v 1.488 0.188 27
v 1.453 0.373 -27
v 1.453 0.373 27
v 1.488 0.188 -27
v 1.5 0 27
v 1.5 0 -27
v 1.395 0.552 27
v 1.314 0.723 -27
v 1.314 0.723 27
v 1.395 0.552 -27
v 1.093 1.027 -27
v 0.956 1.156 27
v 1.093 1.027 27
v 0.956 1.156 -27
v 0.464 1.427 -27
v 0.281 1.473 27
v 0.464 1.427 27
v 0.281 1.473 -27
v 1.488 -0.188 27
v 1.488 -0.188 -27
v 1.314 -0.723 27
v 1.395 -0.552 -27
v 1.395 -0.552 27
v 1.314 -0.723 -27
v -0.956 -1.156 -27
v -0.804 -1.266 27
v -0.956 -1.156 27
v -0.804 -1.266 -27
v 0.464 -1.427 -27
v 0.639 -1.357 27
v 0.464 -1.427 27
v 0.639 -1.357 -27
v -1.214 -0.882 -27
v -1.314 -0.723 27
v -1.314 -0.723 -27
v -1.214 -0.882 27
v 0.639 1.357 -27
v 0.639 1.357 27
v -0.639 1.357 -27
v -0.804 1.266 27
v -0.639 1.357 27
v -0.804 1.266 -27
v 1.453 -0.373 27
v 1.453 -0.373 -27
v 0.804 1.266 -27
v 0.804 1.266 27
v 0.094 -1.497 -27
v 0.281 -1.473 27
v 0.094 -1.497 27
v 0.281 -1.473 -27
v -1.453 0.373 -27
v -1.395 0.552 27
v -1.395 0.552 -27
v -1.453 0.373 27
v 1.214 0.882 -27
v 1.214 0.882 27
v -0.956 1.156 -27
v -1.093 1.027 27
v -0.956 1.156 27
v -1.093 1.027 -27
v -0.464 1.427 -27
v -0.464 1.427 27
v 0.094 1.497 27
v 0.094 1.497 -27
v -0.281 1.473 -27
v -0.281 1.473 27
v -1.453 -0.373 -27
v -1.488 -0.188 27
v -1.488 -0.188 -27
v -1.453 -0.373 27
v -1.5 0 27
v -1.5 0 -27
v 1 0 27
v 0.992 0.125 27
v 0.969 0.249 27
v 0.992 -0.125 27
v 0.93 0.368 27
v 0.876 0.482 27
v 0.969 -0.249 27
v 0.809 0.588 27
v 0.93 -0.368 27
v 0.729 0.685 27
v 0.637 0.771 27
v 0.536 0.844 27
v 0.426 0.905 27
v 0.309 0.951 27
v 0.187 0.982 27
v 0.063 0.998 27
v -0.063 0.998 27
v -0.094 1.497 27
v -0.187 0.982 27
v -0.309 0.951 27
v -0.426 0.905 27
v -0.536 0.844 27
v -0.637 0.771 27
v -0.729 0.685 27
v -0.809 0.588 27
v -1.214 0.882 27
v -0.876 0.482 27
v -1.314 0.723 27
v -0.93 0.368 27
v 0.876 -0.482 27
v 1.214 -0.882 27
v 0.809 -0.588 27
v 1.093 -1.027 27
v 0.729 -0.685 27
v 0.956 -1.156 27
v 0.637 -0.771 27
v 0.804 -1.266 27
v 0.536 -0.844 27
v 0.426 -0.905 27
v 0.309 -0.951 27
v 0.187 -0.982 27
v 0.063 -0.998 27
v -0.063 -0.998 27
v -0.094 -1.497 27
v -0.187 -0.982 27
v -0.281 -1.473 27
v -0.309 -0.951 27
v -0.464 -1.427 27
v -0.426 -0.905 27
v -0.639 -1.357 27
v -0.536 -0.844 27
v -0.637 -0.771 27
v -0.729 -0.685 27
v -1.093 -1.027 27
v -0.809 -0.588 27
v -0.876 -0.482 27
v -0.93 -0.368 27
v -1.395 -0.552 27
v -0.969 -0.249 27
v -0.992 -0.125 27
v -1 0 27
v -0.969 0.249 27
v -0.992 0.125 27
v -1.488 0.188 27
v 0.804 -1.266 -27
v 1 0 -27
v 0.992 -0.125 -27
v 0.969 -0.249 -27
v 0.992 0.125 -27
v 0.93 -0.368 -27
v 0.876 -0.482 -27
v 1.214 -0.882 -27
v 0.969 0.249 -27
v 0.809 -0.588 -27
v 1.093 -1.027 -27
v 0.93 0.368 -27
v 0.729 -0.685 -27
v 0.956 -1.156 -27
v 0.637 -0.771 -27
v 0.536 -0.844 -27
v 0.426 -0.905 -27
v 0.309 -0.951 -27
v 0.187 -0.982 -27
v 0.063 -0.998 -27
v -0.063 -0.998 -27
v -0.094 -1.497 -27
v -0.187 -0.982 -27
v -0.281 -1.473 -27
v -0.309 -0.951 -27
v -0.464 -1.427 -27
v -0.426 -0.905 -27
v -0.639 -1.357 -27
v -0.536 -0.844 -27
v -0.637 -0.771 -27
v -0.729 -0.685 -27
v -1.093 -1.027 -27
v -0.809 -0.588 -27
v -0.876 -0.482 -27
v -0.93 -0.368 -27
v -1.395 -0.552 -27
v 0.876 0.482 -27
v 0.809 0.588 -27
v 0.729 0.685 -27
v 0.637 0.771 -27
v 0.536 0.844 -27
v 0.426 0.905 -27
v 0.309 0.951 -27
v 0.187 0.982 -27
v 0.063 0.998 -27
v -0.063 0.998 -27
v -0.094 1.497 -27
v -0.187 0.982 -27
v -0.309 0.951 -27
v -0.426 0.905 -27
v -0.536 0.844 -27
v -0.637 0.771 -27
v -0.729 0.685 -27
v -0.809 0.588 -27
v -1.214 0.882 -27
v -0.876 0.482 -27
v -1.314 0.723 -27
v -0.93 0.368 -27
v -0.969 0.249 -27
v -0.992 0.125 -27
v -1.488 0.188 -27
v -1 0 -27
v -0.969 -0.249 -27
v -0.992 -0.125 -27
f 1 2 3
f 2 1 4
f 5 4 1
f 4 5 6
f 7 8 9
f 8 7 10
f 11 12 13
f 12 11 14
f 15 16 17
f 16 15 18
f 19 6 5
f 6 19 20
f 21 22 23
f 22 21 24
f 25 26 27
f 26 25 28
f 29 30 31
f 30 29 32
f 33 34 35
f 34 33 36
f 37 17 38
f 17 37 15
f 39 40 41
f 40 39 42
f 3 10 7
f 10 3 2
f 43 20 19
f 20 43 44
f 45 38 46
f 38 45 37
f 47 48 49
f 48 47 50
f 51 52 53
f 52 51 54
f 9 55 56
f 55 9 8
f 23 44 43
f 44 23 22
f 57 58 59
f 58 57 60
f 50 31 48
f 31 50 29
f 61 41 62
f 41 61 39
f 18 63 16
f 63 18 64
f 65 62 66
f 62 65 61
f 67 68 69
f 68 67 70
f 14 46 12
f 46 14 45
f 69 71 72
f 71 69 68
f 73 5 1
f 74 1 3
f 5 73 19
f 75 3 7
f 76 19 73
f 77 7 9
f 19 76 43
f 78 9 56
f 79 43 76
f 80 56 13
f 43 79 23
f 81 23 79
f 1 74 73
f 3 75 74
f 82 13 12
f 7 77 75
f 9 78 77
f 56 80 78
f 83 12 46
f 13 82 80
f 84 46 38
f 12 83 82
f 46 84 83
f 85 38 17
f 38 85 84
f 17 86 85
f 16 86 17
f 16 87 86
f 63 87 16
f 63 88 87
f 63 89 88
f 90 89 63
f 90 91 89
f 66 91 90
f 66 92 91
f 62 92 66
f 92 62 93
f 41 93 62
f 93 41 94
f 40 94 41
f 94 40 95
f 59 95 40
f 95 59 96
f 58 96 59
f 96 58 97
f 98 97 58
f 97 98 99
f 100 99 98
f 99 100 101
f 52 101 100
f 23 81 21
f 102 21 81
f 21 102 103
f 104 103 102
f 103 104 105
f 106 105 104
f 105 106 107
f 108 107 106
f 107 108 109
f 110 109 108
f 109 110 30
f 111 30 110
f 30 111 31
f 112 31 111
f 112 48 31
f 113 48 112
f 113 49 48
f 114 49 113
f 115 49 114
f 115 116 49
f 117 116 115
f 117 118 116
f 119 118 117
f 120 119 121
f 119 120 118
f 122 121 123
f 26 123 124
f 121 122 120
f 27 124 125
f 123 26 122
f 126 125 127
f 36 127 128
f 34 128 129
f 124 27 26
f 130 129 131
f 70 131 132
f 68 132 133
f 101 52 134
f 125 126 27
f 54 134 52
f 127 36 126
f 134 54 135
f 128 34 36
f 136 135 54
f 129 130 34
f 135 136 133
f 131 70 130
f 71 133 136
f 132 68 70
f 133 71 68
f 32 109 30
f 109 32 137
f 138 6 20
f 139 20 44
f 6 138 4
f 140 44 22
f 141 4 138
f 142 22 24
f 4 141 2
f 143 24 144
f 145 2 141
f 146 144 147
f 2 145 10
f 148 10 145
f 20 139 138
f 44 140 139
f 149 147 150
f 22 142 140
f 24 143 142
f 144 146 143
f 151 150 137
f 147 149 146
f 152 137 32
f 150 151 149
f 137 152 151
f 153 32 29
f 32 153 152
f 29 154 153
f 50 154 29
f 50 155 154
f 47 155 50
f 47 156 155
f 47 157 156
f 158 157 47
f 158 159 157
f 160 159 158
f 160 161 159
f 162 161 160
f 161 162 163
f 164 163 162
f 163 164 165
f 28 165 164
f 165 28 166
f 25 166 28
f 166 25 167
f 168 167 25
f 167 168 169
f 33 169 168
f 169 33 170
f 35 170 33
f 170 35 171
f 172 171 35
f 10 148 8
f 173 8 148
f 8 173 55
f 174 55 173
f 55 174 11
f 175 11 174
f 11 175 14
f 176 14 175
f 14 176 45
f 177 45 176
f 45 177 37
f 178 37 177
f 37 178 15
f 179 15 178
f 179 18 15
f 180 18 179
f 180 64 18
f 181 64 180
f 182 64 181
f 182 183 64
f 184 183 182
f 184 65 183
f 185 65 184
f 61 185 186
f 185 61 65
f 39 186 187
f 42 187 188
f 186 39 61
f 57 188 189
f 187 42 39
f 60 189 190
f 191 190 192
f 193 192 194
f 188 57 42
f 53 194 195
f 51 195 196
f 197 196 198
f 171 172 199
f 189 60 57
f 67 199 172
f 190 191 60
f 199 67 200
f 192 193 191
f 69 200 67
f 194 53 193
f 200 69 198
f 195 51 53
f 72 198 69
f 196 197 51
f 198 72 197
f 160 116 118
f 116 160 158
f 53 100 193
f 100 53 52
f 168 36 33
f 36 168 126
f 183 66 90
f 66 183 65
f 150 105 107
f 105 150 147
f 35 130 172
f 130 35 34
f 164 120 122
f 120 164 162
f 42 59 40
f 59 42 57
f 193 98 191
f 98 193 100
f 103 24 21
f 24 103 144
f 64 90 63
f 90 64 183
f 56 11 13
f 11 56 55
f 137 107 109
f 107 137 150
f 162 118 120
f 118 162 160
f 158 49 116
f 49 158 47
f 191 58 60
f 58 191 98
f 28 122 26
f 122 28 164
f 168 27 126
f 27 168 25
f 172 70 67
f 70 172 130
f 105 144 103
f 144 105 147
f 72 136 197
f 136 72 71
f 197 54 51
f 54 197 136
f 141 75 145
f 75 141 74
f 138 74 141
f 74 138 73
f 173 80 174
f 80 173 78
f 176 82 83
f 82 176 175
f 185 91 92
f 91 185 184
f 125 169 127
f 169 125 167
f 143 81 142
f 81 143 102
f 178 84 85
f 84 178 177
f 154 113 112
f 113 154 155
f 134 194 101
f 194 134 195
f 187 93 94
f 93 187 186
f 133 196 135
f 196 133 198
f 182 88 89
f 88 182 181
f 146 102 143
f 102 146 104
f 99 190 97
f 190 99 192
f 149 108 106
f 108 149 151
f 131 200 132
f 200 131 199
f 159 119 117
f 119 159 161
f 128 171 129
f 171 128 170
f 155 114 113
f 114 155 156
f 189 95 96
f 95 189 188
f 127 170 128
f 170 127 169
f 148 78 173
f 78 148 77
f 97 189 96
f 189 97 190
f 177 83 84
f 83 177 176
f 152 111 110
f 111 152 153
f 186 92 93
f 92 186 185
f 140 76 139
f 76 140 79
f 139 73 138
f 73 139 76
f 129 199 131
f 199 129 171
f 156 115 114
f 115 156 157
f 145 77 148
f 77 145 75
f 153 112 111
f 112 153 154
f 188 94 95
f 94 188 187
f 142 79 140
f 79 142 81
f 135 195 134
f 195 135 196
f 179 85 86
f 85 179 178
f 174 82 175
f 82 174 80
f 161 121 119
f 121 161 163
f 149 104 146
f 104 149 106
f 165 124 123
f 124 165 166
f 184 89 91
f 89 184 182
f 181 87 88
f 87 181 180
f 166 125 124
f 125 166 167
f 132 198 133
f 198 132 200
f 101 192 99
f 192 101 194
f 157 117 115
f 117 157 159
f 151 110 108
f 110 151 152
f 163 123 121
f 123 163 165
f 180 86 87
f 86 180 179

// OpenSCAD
$fn = 50;


difference() {
	union() {
		translate(v = [0, 0, -27.0000000000]) {
			cylinder(h = 54, r = 1.5000000000);
		}
	}
	union() {
		translate(v = [0, 0, -100.0000000000]) {
			cylinder(h = 200, r = 1.0000000000);
		}
	}
}
